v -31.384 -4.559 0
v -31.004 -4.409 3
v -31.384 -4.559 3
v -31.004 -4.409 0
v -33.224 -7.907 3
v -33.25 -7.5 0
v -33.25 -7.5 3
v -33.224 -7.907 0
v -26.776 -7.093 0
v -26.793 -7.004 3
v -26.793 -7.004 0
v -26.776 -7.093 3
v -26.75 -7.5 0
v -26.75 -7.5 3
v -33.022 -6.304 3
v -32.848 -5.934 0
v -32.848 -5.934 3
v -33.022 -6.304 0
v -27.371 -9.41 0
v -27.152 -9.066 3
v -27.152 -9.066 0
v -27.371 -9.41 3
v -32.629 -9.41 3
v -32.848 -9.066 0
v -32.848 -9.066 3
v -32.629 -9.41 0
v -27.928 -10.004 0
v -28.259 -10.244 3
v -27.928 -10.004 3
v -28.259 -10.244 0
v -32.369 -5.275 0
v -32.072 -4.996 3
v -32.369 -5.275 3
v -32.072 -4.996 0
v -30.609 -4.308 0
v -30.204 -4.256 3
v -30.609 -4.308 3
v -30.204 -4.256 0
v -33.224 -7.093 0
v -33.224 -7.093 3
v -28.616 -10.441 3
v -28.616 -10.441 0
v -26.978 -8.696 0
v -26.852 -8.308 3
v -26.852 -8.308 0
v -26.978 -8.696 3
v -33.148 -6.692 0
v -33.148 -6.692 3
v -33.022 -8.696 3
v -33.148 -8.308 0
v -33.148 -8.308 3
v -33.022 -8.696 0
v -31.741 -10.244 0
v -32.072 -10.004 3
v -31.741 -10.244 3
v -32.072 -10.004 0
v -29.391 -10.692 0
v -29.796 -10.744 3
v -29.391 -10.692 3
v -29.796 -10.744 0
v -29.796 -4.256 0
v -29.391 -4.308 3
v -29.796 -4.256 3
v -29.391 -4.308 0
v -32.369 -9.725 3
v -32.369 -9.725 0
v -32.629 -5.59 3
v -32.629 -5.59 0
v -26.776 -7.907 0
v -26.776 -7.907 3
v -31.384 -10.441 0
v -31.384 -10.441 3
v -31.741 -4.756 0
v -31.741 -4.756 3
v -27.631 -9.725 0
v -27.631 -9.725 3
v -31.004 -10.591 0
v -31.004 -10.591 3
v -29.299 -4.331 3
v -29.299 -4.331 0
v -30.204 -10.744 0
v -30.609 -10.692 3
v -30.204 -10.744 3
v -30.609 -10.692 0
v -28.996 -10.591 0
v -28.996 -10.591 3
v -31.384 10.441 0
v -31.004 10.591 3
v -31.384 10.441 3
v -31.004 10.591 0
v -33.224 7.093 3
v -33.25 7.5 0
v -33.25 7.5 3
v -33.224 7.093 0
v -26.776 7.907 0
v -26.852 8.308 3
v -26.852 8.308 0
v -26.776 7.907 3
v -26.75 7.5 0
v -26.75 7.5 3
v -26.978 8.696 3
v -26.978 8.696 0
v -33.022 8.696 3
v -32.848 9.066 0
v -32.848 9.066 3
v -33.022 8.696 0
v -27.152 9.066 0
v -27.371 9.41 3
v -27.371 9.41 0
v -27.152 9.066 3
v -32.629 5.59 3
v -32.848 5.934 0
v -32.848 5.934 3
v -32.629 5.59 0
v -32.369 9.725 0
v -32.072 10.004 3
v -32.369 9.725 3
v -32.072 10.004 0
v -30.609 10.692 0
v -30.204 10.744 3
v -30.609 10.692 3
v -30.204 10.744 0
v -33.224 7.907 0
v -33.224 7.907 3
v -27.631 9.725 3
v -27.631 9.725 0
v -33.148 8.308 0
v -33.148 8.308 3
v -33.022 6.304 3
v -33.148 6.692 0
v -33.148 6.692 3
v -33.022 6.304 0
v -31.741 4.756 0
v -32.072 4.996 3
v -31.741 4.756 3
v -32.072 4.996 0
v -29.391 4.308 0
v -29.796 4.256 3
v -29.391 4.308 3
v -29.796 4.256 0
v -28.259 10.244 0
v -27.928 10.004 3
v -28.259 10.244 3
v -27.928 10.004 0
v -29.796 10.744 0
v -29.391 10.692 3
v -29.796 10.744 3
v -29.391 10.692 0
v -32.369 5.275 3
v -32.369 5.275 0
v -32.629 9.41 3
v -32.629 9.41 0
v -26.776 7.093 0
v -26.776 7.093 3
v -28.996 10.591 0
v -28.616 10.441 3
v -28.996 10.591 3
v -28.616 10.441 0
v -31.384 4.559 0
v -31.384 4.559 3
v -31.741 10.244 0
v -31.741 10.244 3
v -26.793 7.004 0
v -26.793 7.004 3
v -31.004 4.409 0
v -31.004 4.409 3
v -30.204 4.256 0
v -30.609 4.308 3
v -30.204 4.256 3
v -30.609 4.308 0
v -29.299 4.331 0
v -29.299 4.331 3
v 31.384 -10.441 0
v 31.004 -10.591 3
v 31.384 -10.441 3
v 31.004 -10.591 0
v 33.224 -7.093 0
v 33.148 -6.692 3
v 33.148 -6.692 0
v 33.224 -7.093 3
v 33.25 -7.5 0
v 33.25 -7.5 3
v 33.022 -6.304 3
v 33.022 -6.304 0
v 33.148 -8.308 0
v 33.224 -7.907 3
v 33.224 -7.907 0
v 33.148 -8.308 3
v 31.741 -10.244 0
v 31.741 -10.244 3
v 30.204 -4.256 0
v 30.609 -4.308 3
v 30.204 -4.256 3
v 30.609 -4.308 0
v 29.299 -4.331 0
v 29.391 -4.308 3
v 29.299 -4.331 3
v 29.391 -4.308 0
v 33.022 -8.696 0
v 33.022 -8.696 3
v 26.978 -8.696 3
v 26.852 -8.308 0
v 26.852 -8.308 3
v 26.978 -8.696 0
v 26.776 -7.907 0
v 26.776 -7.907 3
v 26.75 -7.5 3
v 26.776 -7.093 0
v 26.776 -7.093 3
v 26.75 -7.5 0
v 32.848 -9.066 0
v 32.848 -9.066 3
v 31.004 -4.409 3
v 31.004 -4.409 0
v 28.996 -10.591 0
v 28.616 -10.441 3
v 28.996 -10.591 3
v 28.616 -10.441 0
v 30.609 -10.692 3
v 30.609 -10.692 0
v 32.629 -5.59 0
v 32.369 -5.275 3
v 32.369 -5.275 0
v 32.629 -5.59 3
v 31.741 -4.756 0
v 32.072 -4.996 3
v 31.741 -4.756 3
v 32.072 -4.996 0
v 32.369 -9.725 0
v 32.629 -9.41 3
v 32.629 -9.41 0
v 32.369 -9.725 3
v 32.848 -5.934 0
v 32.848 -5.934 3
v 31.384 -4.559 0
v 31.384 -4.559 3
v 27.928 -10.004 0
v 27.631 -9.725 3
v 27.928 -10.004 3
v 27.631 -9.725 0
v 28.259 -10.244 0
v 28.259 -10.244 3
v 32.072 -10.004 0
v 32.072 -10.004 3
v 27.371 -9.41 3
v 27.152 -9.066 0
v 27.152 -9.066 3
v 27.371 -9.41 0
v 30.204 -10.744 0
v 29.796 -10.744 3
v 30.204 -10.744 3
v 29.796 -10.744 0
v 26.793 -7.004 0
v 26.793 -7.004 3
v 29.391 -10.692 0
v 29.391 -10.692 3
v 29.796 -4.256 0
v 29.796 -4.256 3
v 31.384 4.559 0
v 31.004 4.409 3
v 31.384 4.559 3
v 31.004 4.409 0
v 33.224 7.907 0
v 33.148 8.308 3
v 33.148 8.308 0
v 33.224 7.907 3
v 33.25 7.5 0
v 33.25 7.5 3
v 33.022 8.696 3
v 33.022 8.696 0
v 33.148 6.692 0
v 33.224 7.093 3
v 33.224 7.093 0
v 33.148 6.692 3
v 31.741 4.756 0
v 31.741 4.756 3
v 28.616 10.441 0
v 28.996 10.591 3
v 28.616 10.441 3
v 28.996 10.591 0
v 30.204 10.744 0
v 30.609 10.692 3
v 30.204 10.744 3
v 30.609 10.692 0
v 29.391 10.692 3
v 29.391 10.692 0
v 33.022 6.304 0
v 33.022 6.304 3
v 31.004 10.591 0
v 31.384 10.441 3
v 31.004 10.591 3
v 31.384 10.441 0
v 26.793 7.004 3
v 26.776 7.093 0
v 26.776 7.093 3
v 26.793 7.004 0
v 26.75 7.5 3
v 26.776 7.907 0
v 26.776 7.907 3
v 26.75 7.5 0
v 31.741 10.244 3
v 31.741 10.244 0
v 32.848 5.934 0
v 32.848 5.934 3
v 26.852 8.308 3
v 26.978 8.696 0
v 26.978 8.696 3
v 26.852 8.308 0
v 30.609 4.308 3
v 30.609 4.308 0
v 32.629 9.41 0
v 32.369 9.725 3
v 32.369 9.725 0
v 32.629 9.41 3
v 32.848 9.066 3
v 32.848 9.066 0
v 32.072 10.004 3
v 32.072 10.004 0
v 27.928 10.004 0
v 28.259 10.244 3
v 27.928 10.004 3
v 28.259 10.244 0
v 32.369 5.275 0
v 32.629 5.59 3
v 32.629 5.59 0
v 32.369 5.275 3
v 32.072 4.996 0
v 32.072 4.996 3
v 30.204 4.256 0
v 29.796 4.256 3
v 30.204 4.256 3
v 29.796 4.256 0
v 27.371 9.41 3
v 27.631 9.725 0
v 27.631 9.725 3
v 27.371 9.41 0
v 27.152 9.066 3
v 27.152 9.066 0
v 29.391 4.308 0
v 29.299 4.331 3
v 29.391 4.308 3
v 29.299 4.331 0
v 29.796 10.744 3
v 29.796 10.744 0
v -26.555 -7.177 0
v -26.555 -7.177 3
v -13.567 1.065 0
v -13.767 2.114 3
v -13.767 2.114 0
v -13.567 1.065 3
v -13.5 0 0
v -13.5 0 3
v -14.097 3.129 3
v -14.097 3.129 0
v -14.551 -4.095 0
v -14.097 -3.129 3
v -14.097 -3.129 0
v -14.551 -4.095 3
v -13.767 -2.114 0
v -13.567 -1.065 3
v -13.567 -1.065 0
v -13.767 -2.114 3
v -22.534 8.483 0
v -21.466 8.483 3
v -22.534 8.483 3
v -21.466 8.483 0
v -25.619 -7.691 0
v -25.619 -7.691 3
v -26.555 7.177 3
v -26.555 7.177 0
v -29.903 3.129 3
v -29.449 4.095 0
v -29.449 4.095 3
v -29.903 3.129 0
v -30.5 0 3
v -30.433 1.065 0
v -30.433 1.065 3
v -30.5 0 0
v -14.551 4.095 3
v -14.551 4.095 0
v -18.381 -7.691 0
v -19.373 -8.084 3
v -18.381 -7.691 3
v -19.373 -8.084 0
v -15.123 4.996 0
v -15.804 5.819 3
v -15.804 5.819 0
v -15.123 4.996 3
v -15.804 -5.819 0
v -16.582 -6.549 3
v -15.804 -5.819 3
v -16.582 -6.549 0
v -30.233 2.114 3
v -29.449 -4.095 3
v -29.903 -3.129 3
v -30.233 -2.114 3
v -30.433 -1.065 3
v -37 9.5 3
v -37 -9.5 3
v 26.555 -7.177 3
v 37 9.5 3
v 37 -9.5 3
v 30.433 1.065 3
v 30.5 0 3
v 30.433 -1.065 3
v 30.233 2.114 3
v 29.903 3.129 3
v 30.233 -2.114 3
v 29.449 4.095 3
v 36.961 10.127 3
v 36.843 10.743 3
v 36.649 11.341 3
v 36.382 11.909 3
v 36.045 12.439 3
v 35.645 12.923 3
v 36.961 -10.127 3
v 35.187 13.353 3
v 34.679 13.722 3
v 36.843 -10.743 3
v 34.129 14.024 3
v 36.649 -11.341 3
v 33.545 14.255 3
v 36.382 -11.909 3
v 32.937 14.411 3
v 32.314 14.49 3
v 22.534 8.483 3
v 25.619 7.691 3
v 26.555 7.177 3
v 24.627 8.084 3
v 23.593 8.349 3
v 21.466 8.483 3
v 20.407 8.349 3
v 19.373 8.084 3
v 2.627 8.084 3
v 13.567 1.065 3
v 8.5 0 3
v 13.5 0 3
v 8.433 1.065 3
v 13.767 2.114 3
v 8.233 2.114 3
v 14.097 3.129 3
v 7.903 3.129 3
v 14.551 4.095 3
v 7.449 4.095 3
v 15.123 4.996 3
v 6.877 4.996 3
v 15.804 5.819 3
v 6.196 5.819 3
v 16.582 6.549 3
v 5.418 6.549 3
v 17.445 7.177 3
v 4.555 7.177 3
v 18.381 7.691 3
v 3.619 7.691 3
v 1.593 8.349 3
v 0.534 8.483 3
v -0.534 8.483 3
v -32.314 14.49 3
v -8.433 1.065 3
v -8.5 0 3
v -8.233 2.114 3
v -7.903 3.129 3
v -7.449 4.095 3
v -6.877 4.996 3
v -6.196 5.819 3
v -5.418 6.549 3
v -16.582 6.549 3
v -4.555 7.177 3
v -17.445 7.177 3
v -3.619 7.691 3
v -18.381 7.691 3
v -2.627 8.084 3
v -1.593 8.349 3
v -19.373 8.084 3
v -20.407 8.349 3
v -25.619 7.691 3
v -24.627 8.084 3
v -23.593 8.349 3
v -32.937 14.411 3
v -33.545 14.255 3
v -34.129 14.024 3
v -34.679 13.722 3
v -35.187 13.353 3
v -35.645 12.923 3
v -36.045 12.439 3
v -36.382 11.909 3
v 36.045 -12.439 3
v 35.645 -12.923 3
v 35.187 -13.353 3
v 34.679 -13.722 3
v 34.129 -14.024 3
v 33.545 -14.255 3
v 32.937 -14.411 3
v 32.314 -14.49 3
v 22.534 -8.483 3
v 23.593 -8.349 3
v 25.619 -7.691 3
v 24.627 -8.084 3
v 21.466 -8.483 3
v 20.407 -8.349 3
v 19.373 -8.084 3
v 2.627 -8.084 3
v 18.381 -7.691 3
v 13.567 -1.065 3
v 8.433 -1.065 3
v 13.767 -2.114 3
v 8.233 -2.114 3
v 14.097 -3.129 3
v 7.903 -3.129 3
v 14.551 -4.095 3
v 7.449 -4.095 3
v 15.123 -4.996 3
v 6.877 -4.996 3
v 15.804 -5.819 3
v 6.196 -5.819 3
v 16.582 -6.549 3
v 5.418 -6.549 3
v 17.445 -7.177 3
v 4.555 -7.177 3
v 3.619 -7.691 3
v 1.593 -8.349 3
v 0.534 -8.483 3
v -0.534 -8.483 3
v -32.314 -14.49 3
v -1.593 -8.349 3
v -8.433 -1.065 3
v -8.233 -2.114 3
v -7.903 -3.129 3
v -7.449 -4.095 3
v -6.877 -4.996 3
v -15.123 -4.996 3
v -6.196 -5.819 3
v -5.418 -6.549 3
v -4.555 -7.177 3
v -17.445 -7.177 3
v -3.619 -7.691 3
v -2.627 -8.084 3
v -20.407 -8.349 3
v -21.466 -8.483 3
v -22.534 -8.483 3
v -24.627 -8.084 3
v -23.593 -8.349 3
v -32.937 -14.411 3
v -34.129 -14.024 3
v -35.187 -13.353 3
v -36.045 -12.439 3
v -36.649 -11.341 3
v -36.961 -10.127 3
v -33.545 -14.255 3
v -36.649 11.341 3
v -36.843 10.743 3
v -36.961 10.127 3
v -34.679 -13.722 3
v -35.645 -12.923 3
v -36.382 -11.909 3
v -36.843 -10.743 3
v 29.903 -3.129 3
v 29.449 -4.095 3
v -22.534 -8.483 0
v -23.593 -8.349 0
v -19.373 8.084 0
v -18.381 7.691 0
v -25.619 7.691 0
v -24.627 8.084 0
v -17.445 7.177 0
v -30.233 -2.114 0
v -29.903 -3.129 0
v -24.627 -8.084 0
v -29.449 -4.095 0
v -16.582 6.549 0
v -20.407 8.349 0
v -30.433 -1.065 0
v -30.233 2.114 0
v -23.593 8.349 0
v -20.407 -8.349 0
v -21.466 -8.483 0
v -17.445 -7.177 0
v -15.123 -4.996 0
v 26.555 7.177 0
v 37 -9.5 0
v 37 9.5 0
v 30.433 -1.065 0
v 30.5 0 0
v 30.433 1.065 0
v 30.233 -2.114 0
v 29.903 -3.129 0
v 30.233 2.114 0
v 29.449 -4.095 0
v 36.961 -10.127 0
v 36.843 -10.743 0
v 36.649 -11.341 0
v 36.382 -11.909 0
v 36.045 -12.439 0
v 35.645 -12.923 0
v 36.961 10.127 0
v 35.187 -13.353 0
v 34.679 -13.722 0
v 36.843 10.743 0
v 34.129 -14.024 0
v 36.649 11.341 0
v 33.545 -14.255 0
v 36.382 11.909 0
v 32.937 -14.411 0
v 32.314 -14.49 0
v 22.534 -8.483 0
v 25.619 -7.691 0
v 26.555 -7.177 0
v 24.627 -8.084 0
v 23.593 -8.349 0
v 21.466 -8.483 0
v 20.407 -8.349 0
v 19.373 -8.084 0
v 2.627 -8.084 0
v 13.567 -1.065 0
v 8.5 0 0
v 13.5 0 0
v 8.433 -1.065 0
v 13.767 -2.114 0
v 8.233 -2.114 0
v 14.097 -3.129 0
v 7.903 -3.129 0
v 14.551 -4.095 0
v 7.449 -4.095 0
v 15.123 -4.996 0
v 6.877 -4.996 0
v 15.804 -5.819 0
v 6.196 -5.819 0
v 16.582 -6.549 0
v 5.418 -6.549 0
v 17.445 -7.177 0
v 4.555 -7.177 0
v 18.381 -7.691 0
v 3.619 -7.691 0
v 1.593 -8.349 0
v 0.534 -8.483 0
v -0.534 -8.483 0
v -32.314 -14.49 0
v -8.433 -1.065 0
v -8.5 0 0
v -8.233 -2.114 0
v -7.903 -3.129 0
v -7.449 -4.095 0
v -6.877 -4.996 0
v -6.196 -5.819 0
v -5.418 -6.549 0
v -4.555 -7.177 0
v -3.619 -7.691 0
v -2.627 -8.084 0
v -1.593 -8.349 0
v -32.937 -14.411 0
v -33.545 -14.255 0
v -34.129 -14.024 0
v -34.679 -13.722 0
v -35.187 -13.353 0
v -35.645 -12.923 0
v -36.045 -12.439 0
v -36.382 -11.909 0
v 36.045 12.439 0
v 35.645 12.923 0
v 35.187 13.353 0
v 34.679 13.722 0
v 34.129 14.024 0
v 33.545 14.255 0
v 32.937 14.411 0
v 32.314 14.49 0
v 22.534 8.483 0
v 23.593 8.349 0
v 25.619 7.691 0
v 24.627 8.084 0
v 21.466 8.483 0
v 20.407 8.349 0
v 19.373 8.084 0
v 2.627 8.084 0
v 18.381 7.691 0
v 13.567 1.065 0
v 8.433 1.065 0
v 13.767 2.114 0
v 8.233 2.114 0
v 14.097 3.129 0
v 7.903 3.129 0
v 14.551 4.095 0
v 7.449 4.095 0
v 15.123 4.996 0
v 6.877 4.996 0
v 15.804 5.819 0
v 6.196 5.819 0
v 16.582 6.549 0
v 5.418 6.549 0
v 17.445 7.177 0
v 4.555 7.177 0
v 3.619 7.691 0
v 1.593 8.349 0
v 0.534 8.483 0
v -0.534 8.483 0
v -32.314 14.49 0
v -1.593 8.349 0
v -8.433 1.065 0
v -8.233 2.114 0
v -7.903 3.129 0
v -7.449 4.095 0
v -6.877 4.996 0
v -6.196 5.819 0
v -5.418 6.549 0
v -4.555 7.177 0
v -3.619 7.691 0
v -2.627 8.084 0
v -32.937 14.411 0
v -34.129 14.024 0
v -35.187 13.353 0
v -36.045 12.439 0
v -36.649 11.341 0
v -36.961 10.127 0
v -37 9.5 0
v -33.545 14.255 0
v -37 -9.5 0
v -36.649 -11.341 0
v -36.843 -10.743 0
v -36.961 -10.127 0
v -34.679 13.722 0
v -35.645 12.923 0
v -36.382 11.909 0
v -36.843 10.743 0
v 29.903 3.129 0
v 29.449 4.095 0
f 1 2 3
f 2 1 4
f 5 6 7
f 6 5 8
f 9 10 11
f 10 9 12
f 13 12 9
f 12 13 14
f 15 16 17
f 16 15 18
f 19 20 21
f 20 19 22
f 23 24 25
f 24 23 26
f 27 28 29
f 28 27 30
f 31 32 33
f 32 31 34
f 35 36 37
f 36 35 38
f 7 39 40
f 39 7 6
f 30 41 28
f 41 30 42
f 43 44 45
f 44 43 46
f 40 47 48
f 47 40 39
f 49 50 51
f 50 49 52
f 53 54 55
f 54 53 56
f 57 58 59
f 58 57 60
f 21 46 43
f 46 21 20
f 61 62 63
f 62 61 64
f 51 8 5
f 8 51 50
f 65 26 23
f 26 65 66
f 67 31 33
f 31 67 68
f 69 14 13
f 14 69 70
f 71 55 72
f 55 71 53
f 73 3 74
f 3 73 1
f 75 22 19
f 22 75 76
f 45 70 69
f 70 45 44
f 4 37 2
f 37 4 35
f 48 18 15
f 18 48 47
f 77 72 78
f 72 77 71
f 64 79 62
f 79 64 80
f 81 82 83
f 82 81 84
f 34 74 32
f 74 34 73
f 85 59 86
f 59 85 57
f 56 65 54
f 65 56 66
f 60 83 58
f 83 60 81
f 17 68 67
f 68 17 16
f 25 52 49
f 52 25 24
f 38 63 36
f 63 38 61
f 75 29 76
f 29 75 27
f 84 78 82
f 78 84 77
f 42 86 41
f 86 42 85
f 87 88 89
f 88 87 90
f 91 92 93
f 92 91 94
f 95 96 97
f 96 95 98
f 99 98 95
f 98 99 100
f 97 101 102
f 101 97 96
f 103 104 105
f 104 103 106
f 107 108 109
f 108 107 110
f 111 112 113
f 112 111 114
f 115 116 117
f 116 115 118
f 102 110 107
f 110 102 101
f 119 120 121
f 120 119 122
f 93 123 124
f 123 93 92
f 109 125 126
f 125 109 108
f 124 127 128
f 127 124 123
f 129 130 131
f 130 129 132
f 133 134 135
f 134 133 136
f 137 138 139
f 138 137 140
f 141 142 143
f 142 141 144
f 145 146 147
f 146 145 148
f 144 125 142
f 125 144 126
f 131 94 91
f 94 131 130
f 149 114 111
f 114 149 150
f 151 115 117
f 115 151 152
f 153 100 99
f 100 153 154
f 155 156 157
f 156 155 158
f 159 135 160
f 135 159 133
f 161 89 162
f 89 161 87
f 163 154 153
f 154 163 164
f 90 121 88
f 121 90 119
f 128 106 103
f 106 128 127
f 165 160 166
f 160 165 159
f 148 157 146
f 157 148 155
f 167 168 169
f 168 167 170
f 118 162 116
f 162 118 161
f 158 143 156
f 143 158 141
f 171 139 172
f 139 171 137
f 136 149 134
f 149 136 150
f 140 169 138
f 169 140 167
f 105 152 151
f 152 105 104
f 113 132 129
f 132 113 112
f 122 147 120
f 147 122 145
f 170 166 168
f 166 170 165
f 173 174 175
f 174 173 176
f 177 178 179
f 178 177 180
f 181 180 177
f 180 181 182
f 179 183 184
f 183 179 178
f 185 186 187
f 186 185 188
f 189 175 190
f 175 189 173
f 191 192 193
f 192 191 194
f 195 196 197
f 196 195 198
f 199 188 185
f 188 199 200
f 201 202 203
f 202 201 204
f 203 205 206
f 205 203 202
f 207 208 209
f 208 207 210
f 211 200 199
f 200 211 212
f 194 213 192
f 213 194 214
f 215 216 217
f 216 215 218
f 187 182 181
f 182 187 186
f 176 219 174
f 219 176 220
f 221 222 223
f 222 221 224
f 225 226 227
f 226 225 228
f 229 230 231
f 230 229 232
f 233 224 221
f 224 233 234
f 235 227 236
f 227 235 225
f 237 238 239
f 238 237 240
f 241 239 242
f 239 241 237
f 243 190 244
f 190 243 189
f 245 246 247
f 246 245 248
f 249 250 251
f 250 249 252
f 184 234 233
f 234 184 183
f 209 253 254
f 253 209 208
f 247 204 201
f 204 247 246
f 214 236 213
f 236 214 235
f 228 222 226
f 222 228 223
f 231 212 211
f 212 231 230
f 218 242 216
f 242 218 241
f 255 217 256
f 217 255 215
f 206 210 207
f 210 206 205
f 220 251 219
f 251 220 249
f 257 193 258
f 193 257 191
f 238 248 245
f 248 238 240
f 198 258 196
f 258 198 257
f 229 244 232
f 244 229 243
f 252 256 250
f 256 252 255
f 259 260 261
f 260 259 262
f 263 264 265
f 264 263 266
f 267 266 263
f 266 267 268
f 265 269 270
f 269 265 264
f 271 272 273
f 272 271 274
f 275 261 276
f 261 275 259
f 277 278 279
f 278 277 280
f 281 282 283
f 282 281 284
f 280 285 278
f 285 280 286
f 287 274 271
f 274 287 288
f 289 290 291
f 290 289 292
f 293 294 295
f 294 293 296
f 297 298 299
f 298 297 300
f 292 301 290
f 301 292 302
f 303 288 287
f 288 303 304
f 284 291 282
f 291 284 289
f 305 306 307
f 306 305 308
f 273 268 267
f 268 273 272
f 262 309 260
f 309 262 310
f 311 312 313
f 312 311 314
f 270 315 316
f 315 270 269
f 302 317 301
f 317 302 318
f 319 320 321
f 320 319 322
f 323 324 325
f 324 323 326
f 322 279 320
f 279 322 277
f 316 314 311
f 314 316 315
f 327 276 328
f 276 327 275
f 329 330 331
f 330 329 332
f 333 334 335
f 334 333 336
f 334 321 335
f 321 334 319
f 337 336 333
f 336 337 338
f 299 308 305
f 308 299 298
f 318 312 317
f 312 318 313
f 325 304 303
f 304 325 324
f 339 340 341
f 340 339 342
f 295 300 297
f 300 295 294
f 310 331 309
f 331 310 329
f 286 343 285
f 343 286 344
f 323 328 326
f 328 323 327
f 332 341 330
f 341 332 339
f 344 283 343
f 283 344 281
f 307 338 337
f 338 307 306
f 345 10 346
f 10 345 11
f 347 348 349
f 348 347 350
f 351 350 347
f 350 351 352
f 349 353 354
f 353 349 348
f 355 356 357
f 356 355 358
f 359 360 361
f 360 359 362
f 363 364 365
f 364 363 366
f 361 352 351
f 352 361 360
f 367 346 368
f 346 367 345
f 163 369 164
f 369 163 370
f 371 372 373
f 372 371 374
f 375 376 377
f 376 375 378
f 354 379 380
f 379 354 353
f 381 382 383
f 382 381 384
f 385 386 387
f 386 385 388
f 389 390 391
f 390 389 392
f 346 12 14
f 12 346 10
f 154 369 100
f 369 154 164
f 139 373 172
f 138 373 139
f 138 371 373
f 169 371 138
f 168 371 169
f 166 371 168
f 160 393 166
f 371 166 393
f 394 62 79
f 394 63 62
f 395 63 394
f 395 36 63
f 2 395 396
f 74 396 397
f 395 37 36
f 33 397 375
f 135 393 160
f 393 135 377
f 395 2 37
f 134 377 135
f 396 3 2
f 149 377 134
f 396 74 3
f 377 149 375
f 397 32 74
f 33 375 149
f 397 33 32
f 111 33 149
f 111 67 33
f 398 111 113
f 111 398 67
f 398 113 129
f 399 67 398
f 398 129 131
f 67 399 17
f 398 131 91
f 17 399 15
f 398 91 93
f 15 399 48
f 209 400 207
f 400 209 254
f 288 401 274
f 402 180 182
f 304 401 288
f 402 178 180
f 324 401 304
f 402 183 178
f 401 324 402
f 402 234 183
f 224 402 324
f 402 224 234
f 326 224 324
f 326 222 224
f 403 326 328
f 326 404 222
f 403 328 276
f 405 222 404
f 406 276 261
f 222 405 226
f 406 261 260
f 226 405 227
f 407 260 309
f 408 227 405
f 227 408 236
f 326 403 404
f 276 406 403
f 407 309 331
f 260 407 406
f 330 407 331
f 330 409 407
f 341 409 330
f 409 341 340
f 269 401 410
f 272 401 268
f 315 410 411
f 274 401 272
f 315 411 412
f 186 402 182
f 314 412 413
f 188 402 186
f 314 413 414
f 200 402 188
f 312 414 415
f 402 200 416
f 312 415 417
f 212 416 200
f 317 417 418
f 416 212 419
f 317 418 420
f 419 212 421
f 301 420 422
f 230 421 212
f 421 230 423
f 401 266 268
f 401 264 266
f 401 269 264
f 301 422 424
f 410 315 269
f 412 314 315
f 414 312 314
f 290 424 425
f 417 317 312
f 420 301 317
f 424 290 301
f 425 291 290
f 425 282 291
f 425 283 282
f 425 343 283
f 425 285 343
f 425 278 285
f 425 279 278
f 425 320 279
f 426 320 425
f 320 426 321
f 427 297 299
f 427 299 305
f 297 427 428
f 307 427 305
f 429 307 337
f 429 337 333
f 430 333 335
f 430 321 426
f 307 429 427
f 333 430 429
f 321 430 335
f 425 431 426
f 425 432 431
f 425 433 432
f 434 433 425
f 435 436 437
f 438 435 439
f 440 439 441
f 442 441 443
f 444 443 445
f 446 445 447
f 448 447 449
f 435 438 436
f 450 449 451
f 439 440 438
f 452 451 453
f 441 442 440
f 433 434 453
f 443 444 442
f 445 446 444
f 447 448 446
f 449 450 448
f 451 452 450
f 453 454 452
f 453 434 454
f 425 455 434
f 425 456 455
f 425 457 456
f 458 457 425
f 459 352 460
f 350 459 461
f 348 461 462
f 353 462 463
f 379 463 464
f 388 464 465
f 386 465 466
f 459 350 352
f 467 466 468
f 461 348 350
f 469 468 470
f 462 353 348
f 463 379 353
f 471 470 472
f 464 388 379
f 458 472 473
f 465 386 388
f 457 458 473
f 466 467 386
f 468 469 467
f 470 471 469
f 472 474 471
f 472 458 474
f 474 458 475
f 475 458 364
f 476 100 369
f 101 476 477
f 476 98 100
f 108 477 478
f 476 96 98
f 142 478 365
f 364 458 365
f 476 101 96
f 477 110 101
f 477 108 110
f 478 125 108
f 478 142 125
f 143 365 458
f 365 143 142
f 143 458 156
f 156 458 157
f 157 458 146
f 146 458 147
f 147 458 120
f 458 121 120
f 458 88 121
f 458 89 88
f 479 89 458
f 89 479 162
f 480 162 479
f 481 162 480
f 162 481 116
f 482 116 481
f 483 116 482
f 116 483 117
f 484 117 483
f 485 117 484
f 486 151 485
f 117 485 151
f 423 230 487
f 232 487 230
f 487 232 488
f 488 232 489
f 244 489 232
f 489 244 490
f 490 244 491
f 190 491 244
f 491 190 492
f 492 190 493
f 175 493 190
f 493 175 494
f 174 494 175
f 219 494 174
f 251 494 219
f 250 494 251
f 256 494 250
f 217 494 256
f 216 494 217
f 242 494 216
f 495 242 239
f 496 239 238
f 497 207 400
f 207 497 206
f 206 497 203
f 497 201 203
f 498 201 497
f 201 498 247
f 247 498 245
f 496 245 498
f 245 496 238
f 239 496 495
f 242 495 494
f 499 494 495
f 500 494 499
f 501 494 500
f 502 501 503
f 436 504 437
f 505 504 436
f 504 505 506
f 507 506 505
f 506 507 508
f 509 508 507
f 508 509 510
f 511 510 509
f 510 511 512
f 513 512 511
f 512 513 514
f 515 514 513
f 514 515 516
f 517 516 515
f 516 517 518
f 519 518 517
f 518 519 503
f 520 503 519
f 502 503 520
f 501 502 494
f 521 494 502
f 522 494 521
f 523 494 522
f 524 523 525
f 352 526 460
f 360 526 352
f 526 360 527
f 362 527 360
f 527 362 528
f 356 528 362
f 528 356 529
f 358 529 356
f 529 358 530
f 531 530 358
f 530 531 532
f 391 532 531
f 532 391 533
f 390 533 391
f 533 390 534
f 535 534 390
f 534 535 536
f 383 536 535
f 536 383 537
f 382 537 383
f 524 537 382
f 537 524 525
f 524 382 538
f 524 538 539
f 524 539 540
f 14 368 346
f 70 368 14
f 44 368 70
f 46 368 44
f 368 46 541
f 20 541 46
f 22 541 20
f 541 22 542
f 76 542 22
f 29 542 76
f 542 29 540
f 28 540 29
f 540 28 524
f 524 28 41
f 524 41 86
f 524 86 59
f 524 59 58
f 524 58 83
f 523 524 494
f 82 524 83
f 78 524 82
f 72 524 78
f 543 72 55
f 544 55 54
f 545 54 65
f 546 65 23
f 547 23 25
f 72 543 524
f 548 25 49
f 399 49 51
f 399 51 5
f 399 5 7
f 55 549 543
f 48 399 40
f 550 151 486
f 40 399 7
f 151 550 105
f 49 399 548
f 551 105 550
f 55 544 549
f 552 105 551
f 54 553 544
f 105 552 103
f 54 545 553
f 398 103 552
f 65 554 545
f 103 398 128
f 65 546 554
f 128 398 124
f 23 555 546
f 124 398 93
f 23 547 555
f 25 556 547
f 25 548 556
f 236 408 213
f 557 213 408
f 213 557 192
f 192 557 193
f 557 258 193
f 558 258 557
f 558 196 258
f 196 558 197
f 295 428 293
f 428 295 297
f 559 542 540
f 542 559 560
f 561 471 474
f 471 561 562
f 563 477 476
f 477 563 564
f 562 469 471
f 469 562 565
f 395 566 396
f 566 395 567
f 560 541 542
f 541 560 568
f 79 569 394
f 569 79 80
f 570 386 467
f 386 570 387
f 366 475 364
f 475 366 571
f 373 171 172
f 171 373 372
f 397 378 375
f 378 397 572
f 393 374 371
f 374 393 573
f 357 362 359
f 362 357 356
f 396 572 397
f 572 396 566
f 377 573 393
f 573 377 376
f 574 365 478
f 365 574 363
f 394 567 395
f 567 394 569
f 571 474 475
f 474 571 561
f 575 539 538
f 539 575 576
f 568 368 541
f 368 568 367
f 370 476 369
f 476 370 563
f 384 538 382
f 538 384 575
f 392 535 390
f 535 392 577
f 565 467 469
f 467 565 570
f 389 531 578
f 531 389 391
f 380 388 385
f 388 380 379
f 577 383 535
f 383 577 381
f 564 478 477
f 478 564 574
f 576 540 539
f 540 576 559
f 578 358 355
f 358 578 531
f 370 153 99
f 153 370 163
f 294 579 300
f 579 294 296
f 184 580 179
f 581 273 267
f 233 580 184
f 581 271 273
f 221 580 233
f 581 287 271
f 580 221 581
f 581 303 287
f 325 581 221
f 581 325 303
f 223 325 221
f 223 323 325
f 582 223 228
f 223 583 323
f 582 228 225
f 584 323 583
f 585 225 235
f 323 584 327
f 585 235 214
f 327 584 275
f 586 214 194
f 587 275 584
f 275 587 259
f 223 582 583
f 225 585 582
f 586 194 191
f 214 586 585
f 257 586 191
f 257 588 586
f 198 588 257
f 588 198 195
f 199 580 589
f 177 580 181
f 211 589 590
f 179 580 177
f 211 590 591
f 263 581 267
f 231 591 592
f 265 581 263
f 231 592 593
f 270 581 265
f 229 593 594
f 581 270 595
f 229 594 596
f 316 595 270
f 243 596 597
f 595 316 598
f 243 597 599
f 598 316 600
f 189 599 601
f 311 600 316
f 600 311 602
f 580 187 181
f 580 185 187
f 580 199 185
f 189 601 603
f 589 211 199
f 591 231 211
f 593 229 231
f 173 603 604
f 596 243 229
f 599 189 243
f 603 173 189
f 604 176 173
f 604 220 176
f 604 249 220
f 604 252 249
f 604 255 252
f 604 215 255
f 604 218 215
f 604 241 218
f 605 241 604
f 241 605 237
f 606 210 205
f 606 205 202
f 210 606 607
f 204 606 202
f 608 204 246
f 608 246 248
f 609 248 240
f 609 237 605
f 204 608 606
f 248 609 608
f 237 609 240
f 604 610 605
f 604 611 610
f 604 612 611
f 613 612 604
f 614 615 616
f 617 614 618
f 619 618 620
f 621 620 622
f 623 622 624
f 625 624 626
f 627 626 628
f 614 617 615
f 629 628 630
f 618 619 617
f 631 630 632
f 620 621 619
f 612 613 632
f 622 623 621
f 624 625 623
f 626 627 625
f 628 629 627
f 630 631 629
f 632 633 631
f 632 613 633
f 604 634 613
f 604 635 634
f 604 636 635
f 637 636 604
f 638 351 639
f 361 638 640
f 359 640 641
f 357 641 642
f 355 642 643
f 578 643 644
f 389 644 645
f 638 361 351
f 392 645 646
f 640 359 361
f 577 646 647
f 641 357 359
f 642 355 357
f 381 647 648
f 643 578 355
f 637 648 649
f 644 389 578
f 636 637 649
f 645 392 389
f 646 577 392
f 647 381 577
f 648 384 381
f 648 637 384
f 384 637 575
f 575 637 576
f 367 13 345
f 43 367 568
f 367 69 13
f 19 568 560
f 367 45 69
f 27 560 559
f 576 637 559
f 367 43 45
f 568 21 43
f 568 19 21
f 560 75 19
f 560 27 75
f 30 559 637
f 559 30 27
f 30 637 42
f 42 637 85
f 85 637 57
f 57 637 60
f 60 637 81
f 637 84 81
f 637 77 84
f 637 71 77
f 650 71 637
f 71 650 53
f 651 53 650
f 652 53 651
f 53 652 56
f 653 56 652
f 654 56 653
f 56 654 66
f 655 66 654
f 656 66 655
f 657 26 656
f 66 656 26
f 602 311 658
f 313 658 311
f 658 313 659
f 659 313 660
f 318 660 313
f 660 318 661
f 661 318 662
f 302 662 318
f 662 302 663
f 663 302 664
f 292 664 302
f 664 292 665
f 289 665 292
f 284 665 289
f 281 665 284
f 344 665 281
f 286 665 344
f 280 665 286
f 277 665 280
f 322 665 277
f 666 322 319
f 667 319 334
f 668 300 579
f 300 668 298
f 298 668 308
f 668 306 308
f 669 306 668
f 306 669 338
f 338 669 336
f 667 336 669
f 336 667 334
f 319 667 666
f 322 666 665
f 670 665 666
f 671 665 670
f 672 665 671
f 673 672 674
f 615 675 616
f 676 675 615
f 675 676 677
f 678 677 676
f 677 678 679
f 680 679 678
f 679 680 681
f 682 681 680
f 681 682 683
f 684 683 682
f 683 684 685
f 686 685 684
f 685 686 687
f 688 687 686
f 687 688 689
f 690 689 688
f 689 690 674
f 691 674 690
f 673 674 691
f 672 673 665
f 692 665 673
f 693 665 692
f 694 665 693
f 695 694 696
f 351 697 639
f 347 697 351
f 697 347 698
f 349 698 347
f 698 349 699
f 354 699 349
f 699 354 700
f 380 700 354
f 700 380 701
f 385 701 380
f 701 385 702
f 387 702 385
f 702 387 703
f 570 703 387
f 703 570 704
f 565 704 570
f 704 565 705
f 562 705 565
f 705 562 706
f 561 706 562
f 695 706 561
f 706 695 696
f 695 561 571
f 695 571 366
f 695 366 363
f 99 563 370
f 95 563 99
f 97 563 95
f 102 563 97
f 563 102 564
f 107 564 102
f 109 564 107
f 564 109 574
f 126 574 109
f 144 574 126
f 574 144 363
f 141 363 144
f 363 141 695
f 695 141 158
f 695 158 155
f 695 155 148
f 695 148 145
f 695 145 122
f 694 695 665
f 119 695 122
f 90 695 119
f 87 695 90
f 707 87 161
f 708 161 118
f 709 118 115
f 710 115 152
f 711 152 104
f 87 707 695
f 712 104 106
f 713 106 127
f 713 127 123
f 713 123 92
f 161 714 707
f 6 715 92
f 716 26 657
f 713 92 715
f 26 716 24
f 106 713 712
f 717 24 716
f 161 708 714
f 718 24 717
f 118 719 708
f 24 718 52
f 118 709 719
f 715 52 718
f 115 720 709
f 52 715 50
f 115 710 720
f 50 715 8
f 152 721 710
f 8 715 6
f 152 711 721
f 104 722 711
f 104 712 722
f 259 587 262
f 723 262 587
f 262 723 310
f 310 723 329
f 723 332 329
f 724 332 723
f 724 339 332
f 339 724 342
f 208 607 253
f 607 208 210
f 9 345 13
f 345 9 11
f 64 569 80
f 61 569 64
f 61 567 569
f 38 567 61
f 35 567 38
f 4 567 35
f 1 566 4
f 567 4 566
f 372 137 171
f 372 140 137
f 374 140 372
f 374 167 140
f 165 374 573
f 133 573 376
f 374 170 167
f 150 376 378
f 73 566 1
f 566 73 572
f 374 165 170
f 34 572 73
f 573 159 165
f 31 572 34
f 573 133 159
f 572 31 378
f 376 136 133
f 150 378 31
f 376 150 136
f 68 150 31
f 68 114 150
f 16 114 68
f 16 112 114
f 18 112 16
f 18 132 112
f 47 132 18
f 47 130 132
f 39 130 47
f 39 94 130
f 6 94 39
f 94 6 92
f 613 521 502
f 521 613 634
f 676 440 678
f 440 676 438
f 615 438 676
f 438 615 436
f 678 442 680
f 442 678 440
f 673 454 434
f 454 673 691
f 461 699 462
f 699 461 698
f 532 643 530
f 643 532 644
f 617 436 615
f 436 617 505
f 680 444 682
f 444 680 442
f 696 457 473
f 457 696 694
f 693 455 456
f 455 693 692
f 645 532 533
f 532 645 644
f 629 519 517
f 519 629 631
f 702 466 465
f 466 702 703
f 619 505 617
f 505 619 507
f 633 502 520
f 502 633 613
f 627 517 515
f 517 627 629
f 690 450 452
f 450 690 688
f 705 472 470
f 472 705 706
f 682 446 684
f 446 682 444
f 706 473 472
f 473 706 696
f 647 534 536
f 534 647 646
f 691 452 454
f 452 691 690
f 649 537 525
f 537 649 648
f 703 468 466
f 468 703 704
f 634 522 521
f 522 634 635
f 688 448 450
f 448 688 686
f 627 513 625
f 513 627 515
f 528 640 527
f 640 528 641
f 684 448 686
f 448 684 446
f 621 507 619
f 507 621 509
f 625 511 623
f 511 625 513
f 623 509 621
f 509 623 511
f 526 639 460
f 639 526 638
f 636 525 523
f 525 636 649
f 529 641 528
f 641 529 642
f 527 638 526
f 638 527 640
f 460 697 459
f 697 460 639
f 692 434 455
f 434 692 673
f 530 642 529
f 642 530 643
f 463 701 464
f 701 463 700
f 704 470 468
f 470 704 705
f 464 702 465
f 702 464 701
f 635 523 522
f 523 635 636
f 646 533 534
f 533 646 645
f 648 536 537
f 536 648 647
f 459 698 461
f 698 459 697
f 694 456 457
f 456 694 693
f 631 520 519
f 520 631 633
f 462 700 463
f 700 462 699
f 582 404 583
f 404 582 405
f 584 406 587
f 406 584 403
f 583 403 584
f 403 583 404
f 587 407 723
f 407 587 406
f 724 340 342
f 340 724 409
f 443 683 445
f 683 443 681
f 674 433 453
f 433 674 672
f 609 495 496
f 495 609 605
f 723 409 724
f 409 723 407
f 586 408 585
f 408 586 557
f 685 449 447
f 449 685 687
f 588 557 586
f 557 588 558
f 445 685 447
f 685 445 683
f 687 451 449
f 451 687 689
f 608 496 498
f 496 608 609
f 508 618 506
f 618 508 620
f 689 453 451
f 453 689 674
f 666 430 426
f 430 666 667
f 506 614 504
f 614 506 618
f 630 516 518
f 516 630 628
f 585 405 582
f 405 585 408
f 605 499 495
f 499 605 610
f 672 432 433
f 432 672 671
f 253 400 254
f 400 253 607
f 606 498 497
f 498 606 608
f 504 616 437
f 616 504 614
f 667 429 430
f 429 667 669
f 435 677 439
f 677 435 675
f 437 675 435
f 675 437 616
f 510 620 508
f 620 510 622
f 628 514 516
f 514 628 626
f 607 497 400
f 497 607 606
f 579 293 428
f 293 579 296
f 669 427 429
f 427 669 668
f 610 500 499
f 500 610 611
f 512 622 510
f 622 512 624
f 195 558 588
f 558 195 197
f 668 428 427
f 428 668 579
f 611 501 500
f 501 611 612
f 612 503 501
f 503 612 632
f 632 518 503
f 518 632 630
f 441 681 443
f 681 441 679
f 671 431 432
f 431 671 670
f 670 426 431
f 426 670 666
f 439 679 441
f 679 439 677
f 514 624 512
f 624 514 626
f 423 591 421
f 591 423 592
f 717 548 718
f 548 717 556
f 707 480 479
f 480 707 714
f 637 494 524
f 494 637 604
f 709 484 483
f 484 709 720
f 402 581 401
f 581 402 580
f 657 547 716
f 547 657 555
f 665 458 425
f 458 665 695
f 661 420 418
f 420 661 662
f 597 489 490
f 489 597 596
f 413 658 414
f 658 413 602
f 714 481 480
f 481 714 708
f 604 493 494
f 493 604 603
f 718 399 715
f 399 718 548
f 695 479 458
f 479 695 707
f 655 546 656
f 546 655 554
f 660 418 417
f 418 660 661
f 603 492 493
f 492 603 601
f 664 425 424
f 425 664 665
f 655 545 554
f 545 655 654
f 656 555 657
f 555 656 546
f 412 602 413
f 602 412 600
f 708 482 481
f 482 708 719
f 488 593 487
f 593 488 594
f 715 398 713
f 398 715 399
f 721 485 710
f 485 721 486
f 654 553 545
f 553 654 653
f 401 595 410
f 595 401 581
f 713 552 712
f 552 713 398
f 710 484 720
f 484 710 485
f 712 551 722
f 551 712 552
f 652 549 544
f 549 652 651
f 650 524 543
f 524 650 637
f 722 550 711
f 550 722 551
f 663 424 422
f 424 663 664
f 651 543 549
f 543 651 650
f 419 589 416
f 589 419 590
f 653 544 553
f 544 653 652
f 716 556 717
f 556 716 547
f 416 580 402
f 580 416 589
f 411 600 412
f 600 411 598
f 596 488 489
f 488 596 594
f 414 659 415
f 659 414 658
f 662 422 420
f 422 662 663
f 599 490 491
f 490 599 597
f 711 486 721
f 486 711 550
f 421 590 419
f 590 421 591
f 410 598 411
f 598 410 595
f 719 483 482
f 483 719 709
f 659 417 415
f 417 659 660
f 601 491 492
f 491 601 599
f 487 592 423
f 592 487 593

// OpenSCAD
$fn = 50;

difference() {
	union() {
		hull() {
			translate(v = [-32.0, 9.5, 0]) {
				cylinder(h = 3, r = 5);
			}
			translate(v = [32.0, 9.5, 0]) {
				cylinder(h = 3, r = 5);
			}
			translate(v = [-32.0, -9.5, 0]) {
				cylinder(h = 3, r = 5);
			}
			translate(v = [32.0, -9.5, 0]) {
				cylinder(h = 3, r = 5);
			}
		}
	}
	union() {
		translate(v = [-30.0, -7.5, -100.0]) {
			cylinder(h = 200, r = 3.25);
		}
		translate(v = [-30.0, 7.5, -100.0]) {
			cylinder(h = 200, r = 3.25);
		}
		translate(v = [30.0, -7.5, -100.0]) {
			cylinder(h = 200, r = 3.25);
		}
		translate(v = [30.0, 7.5, -100.0]) {
			cylinder(h = 200, r = 3.25);
		}
		translate(v = [-30.0, -7.5, -100.0]) {
			cylinder(h = 200, r = 1.8);
		}
		translate(v = [-30.0, 7.5, -100.0]) {
			cylinder(h = 200, r = 1.8);
		}
		translate(v = [30.0, -7.5, -100.0]) {
			cylinder(h = 200, r = 1.8);
		}
		translate(v = [30.0, 7.5, -100.0]) {
			cylinder(h = 200, r = 1.8);
		}
		translate(v = [-22.0, 0, 0.0]) {
			cylinder(h = 3, r = 8.5);
		}
		cylinder(h = 3, r = 8.5);
		translate(v = [22.0, 0, 0.0]) {
			cylinder(h = 3, r = 8.5);
		}
	}
}
